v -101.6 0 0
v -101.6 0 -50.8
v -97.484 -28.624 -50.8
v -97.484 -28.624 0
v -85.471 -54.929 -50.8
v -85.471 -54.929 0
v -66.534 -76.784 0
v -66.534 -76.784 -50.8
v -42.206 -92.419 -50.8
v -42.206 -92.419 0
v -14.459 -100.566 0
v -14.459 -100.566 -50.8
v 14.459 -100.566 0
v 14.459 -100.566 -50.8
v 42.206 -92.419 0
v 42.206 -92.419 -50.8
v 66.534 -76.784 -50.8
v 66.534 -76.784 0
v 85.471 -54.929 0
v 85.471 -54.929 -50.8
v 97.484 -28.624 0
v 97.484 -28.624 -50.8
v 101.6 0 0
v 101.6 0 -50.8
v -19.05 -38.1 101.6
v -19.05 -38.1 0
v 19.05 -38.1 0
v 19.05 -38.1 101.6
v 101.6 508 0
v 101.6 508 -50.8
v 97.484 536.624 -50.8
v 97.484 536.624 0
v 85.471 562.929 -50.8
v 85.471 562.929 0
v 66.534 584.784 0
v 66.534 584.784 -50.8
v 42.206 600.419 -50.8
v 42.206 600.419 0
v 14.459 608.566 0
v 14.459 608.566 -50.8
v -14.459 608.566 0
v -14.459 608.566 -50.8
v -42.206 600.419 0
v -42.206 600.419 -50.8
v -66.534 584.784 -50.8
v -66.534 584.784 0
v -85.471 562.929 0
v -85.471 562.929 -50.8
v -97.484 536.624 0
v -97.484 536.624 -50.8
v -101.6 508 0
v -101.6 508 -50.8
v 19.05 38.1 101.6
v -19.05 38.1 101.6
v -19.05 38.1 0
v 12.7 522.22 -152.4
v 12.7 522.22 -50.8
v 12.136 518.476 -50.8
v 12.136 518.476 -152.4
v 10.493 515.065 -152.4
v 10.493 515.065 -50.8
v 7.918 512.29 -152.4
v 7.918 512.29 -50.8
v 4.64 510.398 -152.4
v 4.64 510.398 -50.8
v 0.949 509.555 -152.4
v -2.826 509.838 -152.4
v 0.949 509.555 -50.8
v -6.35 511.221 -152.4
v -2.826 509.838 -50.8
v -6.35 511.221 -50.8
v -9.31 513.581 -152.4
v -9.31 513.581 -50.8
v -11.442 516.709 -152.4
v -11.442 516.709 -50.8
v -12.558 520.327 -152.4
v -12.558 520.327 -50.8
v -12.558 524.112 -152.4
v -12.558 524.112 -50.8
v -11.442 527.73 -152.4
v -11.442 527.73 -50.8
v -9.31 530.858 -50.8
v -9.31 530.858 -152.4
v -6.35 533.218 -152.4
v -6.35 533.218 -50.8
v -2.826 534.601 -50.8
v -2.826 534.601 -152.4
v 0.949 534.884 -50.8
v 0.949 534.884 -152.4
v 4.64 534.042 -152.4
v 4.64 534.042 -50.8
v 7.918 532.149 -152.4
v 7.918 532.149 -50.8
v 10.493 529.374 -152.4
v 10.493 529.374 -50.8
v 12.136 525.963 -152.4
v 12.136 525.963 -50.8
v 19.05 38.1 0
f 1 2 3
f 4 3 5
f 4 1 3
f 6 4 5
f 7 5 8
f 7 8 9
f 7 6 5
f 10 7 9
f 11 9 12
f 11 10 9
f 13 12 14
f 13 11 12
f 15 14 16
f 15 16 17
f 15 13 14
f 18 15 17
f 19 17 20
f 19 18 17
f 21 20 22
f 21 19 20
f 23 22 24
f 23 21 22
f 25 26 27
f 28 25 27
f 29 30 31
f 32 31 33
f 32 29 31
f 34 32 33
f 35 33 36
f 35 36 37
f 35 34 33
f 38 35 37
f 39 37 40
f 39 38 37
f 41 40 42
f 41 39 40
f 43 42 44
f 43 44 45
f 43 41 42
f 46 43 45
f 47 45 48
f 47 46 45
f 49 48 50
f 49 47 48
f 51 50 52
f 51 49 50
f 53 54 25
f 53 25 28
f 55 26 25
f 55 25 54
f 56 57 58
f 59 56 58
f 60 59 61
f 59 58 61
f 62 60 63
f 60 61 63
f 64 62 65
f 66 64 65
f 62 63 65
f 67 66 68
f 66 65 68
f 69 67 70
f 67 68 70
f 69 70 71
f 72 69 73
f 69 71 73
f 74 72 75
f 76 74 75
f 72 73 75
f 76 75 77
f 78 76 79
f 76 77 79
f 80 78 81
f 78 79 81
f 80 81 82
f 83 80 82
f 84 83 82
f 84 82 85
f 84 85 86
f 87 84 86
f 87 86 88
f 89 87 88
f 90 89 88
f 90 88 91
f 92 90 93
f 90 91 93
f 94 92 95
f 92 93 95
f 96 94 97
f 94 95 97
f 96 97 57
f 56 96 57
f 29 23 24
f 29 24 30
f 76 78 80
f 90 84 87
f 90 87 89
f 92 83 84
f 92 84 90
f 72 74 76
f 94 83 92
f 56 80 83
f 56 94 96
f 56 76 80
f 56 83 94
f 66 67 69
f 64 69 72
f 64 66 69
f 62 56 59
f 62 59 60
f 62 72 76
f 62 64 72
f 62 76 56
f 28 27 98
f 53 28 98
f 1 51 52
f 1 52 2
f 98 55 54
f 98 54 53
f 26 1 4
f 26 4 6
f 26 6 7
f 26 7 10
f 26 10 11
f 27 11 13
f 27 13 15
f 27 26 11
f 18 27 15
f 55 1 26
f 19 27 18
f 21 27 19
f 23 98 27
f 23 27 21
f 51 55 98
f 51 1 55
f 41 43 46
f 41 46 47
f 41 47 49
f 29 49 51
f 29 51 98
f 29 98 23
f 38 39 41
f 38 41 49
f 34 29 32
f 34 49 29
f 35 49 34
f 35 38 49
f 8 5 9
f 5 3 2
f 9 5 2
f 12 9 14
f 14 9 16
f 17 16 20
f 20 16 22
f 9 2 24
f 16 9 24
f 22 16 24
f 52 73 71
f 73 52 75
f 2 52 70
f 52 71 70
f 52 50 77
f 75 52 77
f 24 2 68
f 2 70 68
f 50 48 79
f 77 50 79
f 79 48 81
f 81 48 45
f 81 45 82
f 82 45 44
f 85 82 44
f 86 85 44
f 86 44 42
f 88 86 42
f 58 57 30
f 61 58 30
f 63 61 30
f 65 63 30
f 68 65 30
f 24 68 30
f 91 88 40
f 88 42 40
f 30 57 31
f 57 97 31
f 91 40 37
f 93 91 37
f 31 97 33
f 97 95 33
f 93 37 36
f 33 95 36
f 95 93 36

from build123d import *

# Parameters (mm, degrees)
F1_DEPTH = 50.8
F2_R     = 12.7
F3_DEPTH = 101.6
F4_W     = 38.1
F4_H     = 76.2
F5_DEPTH = 101.6


with BuildPart() as f1:
    # F0 (on Top) → F1 (new body)
    with BuildSketch(Plane.XY):
        with BuildLine():
            Line((-101.6, 508), (-101.6, 0))
            ThreePointArc((-101.6, 0), (0, -101.6), (101.6, 0))
            Line((101.6, 0), (101.6, 508))
            ThreePointArc((101.6, 508), (0, 609.6), (-101.6, 508))
        make_face()
    extrude(amount=-F1_DEPTH)

    # F2 (on face) → F3 (join)
    with BuildSketch(Plane(origin=(0, 0, -50.8), x_dir=(1, 0, 0), z_dir=(0, 0, -1))):
        with Locations((0, -522.219658)):
            Circle(F2_R)
    extrude(amount=F3_DEPTH)

    # F4 (on face) → F5 (join)
    with BuildSketch(Plane.XY):
        Rectangle(F4_W, F4_H)
    extrude(amount=F5_DEPTH)


solid = f1.part
